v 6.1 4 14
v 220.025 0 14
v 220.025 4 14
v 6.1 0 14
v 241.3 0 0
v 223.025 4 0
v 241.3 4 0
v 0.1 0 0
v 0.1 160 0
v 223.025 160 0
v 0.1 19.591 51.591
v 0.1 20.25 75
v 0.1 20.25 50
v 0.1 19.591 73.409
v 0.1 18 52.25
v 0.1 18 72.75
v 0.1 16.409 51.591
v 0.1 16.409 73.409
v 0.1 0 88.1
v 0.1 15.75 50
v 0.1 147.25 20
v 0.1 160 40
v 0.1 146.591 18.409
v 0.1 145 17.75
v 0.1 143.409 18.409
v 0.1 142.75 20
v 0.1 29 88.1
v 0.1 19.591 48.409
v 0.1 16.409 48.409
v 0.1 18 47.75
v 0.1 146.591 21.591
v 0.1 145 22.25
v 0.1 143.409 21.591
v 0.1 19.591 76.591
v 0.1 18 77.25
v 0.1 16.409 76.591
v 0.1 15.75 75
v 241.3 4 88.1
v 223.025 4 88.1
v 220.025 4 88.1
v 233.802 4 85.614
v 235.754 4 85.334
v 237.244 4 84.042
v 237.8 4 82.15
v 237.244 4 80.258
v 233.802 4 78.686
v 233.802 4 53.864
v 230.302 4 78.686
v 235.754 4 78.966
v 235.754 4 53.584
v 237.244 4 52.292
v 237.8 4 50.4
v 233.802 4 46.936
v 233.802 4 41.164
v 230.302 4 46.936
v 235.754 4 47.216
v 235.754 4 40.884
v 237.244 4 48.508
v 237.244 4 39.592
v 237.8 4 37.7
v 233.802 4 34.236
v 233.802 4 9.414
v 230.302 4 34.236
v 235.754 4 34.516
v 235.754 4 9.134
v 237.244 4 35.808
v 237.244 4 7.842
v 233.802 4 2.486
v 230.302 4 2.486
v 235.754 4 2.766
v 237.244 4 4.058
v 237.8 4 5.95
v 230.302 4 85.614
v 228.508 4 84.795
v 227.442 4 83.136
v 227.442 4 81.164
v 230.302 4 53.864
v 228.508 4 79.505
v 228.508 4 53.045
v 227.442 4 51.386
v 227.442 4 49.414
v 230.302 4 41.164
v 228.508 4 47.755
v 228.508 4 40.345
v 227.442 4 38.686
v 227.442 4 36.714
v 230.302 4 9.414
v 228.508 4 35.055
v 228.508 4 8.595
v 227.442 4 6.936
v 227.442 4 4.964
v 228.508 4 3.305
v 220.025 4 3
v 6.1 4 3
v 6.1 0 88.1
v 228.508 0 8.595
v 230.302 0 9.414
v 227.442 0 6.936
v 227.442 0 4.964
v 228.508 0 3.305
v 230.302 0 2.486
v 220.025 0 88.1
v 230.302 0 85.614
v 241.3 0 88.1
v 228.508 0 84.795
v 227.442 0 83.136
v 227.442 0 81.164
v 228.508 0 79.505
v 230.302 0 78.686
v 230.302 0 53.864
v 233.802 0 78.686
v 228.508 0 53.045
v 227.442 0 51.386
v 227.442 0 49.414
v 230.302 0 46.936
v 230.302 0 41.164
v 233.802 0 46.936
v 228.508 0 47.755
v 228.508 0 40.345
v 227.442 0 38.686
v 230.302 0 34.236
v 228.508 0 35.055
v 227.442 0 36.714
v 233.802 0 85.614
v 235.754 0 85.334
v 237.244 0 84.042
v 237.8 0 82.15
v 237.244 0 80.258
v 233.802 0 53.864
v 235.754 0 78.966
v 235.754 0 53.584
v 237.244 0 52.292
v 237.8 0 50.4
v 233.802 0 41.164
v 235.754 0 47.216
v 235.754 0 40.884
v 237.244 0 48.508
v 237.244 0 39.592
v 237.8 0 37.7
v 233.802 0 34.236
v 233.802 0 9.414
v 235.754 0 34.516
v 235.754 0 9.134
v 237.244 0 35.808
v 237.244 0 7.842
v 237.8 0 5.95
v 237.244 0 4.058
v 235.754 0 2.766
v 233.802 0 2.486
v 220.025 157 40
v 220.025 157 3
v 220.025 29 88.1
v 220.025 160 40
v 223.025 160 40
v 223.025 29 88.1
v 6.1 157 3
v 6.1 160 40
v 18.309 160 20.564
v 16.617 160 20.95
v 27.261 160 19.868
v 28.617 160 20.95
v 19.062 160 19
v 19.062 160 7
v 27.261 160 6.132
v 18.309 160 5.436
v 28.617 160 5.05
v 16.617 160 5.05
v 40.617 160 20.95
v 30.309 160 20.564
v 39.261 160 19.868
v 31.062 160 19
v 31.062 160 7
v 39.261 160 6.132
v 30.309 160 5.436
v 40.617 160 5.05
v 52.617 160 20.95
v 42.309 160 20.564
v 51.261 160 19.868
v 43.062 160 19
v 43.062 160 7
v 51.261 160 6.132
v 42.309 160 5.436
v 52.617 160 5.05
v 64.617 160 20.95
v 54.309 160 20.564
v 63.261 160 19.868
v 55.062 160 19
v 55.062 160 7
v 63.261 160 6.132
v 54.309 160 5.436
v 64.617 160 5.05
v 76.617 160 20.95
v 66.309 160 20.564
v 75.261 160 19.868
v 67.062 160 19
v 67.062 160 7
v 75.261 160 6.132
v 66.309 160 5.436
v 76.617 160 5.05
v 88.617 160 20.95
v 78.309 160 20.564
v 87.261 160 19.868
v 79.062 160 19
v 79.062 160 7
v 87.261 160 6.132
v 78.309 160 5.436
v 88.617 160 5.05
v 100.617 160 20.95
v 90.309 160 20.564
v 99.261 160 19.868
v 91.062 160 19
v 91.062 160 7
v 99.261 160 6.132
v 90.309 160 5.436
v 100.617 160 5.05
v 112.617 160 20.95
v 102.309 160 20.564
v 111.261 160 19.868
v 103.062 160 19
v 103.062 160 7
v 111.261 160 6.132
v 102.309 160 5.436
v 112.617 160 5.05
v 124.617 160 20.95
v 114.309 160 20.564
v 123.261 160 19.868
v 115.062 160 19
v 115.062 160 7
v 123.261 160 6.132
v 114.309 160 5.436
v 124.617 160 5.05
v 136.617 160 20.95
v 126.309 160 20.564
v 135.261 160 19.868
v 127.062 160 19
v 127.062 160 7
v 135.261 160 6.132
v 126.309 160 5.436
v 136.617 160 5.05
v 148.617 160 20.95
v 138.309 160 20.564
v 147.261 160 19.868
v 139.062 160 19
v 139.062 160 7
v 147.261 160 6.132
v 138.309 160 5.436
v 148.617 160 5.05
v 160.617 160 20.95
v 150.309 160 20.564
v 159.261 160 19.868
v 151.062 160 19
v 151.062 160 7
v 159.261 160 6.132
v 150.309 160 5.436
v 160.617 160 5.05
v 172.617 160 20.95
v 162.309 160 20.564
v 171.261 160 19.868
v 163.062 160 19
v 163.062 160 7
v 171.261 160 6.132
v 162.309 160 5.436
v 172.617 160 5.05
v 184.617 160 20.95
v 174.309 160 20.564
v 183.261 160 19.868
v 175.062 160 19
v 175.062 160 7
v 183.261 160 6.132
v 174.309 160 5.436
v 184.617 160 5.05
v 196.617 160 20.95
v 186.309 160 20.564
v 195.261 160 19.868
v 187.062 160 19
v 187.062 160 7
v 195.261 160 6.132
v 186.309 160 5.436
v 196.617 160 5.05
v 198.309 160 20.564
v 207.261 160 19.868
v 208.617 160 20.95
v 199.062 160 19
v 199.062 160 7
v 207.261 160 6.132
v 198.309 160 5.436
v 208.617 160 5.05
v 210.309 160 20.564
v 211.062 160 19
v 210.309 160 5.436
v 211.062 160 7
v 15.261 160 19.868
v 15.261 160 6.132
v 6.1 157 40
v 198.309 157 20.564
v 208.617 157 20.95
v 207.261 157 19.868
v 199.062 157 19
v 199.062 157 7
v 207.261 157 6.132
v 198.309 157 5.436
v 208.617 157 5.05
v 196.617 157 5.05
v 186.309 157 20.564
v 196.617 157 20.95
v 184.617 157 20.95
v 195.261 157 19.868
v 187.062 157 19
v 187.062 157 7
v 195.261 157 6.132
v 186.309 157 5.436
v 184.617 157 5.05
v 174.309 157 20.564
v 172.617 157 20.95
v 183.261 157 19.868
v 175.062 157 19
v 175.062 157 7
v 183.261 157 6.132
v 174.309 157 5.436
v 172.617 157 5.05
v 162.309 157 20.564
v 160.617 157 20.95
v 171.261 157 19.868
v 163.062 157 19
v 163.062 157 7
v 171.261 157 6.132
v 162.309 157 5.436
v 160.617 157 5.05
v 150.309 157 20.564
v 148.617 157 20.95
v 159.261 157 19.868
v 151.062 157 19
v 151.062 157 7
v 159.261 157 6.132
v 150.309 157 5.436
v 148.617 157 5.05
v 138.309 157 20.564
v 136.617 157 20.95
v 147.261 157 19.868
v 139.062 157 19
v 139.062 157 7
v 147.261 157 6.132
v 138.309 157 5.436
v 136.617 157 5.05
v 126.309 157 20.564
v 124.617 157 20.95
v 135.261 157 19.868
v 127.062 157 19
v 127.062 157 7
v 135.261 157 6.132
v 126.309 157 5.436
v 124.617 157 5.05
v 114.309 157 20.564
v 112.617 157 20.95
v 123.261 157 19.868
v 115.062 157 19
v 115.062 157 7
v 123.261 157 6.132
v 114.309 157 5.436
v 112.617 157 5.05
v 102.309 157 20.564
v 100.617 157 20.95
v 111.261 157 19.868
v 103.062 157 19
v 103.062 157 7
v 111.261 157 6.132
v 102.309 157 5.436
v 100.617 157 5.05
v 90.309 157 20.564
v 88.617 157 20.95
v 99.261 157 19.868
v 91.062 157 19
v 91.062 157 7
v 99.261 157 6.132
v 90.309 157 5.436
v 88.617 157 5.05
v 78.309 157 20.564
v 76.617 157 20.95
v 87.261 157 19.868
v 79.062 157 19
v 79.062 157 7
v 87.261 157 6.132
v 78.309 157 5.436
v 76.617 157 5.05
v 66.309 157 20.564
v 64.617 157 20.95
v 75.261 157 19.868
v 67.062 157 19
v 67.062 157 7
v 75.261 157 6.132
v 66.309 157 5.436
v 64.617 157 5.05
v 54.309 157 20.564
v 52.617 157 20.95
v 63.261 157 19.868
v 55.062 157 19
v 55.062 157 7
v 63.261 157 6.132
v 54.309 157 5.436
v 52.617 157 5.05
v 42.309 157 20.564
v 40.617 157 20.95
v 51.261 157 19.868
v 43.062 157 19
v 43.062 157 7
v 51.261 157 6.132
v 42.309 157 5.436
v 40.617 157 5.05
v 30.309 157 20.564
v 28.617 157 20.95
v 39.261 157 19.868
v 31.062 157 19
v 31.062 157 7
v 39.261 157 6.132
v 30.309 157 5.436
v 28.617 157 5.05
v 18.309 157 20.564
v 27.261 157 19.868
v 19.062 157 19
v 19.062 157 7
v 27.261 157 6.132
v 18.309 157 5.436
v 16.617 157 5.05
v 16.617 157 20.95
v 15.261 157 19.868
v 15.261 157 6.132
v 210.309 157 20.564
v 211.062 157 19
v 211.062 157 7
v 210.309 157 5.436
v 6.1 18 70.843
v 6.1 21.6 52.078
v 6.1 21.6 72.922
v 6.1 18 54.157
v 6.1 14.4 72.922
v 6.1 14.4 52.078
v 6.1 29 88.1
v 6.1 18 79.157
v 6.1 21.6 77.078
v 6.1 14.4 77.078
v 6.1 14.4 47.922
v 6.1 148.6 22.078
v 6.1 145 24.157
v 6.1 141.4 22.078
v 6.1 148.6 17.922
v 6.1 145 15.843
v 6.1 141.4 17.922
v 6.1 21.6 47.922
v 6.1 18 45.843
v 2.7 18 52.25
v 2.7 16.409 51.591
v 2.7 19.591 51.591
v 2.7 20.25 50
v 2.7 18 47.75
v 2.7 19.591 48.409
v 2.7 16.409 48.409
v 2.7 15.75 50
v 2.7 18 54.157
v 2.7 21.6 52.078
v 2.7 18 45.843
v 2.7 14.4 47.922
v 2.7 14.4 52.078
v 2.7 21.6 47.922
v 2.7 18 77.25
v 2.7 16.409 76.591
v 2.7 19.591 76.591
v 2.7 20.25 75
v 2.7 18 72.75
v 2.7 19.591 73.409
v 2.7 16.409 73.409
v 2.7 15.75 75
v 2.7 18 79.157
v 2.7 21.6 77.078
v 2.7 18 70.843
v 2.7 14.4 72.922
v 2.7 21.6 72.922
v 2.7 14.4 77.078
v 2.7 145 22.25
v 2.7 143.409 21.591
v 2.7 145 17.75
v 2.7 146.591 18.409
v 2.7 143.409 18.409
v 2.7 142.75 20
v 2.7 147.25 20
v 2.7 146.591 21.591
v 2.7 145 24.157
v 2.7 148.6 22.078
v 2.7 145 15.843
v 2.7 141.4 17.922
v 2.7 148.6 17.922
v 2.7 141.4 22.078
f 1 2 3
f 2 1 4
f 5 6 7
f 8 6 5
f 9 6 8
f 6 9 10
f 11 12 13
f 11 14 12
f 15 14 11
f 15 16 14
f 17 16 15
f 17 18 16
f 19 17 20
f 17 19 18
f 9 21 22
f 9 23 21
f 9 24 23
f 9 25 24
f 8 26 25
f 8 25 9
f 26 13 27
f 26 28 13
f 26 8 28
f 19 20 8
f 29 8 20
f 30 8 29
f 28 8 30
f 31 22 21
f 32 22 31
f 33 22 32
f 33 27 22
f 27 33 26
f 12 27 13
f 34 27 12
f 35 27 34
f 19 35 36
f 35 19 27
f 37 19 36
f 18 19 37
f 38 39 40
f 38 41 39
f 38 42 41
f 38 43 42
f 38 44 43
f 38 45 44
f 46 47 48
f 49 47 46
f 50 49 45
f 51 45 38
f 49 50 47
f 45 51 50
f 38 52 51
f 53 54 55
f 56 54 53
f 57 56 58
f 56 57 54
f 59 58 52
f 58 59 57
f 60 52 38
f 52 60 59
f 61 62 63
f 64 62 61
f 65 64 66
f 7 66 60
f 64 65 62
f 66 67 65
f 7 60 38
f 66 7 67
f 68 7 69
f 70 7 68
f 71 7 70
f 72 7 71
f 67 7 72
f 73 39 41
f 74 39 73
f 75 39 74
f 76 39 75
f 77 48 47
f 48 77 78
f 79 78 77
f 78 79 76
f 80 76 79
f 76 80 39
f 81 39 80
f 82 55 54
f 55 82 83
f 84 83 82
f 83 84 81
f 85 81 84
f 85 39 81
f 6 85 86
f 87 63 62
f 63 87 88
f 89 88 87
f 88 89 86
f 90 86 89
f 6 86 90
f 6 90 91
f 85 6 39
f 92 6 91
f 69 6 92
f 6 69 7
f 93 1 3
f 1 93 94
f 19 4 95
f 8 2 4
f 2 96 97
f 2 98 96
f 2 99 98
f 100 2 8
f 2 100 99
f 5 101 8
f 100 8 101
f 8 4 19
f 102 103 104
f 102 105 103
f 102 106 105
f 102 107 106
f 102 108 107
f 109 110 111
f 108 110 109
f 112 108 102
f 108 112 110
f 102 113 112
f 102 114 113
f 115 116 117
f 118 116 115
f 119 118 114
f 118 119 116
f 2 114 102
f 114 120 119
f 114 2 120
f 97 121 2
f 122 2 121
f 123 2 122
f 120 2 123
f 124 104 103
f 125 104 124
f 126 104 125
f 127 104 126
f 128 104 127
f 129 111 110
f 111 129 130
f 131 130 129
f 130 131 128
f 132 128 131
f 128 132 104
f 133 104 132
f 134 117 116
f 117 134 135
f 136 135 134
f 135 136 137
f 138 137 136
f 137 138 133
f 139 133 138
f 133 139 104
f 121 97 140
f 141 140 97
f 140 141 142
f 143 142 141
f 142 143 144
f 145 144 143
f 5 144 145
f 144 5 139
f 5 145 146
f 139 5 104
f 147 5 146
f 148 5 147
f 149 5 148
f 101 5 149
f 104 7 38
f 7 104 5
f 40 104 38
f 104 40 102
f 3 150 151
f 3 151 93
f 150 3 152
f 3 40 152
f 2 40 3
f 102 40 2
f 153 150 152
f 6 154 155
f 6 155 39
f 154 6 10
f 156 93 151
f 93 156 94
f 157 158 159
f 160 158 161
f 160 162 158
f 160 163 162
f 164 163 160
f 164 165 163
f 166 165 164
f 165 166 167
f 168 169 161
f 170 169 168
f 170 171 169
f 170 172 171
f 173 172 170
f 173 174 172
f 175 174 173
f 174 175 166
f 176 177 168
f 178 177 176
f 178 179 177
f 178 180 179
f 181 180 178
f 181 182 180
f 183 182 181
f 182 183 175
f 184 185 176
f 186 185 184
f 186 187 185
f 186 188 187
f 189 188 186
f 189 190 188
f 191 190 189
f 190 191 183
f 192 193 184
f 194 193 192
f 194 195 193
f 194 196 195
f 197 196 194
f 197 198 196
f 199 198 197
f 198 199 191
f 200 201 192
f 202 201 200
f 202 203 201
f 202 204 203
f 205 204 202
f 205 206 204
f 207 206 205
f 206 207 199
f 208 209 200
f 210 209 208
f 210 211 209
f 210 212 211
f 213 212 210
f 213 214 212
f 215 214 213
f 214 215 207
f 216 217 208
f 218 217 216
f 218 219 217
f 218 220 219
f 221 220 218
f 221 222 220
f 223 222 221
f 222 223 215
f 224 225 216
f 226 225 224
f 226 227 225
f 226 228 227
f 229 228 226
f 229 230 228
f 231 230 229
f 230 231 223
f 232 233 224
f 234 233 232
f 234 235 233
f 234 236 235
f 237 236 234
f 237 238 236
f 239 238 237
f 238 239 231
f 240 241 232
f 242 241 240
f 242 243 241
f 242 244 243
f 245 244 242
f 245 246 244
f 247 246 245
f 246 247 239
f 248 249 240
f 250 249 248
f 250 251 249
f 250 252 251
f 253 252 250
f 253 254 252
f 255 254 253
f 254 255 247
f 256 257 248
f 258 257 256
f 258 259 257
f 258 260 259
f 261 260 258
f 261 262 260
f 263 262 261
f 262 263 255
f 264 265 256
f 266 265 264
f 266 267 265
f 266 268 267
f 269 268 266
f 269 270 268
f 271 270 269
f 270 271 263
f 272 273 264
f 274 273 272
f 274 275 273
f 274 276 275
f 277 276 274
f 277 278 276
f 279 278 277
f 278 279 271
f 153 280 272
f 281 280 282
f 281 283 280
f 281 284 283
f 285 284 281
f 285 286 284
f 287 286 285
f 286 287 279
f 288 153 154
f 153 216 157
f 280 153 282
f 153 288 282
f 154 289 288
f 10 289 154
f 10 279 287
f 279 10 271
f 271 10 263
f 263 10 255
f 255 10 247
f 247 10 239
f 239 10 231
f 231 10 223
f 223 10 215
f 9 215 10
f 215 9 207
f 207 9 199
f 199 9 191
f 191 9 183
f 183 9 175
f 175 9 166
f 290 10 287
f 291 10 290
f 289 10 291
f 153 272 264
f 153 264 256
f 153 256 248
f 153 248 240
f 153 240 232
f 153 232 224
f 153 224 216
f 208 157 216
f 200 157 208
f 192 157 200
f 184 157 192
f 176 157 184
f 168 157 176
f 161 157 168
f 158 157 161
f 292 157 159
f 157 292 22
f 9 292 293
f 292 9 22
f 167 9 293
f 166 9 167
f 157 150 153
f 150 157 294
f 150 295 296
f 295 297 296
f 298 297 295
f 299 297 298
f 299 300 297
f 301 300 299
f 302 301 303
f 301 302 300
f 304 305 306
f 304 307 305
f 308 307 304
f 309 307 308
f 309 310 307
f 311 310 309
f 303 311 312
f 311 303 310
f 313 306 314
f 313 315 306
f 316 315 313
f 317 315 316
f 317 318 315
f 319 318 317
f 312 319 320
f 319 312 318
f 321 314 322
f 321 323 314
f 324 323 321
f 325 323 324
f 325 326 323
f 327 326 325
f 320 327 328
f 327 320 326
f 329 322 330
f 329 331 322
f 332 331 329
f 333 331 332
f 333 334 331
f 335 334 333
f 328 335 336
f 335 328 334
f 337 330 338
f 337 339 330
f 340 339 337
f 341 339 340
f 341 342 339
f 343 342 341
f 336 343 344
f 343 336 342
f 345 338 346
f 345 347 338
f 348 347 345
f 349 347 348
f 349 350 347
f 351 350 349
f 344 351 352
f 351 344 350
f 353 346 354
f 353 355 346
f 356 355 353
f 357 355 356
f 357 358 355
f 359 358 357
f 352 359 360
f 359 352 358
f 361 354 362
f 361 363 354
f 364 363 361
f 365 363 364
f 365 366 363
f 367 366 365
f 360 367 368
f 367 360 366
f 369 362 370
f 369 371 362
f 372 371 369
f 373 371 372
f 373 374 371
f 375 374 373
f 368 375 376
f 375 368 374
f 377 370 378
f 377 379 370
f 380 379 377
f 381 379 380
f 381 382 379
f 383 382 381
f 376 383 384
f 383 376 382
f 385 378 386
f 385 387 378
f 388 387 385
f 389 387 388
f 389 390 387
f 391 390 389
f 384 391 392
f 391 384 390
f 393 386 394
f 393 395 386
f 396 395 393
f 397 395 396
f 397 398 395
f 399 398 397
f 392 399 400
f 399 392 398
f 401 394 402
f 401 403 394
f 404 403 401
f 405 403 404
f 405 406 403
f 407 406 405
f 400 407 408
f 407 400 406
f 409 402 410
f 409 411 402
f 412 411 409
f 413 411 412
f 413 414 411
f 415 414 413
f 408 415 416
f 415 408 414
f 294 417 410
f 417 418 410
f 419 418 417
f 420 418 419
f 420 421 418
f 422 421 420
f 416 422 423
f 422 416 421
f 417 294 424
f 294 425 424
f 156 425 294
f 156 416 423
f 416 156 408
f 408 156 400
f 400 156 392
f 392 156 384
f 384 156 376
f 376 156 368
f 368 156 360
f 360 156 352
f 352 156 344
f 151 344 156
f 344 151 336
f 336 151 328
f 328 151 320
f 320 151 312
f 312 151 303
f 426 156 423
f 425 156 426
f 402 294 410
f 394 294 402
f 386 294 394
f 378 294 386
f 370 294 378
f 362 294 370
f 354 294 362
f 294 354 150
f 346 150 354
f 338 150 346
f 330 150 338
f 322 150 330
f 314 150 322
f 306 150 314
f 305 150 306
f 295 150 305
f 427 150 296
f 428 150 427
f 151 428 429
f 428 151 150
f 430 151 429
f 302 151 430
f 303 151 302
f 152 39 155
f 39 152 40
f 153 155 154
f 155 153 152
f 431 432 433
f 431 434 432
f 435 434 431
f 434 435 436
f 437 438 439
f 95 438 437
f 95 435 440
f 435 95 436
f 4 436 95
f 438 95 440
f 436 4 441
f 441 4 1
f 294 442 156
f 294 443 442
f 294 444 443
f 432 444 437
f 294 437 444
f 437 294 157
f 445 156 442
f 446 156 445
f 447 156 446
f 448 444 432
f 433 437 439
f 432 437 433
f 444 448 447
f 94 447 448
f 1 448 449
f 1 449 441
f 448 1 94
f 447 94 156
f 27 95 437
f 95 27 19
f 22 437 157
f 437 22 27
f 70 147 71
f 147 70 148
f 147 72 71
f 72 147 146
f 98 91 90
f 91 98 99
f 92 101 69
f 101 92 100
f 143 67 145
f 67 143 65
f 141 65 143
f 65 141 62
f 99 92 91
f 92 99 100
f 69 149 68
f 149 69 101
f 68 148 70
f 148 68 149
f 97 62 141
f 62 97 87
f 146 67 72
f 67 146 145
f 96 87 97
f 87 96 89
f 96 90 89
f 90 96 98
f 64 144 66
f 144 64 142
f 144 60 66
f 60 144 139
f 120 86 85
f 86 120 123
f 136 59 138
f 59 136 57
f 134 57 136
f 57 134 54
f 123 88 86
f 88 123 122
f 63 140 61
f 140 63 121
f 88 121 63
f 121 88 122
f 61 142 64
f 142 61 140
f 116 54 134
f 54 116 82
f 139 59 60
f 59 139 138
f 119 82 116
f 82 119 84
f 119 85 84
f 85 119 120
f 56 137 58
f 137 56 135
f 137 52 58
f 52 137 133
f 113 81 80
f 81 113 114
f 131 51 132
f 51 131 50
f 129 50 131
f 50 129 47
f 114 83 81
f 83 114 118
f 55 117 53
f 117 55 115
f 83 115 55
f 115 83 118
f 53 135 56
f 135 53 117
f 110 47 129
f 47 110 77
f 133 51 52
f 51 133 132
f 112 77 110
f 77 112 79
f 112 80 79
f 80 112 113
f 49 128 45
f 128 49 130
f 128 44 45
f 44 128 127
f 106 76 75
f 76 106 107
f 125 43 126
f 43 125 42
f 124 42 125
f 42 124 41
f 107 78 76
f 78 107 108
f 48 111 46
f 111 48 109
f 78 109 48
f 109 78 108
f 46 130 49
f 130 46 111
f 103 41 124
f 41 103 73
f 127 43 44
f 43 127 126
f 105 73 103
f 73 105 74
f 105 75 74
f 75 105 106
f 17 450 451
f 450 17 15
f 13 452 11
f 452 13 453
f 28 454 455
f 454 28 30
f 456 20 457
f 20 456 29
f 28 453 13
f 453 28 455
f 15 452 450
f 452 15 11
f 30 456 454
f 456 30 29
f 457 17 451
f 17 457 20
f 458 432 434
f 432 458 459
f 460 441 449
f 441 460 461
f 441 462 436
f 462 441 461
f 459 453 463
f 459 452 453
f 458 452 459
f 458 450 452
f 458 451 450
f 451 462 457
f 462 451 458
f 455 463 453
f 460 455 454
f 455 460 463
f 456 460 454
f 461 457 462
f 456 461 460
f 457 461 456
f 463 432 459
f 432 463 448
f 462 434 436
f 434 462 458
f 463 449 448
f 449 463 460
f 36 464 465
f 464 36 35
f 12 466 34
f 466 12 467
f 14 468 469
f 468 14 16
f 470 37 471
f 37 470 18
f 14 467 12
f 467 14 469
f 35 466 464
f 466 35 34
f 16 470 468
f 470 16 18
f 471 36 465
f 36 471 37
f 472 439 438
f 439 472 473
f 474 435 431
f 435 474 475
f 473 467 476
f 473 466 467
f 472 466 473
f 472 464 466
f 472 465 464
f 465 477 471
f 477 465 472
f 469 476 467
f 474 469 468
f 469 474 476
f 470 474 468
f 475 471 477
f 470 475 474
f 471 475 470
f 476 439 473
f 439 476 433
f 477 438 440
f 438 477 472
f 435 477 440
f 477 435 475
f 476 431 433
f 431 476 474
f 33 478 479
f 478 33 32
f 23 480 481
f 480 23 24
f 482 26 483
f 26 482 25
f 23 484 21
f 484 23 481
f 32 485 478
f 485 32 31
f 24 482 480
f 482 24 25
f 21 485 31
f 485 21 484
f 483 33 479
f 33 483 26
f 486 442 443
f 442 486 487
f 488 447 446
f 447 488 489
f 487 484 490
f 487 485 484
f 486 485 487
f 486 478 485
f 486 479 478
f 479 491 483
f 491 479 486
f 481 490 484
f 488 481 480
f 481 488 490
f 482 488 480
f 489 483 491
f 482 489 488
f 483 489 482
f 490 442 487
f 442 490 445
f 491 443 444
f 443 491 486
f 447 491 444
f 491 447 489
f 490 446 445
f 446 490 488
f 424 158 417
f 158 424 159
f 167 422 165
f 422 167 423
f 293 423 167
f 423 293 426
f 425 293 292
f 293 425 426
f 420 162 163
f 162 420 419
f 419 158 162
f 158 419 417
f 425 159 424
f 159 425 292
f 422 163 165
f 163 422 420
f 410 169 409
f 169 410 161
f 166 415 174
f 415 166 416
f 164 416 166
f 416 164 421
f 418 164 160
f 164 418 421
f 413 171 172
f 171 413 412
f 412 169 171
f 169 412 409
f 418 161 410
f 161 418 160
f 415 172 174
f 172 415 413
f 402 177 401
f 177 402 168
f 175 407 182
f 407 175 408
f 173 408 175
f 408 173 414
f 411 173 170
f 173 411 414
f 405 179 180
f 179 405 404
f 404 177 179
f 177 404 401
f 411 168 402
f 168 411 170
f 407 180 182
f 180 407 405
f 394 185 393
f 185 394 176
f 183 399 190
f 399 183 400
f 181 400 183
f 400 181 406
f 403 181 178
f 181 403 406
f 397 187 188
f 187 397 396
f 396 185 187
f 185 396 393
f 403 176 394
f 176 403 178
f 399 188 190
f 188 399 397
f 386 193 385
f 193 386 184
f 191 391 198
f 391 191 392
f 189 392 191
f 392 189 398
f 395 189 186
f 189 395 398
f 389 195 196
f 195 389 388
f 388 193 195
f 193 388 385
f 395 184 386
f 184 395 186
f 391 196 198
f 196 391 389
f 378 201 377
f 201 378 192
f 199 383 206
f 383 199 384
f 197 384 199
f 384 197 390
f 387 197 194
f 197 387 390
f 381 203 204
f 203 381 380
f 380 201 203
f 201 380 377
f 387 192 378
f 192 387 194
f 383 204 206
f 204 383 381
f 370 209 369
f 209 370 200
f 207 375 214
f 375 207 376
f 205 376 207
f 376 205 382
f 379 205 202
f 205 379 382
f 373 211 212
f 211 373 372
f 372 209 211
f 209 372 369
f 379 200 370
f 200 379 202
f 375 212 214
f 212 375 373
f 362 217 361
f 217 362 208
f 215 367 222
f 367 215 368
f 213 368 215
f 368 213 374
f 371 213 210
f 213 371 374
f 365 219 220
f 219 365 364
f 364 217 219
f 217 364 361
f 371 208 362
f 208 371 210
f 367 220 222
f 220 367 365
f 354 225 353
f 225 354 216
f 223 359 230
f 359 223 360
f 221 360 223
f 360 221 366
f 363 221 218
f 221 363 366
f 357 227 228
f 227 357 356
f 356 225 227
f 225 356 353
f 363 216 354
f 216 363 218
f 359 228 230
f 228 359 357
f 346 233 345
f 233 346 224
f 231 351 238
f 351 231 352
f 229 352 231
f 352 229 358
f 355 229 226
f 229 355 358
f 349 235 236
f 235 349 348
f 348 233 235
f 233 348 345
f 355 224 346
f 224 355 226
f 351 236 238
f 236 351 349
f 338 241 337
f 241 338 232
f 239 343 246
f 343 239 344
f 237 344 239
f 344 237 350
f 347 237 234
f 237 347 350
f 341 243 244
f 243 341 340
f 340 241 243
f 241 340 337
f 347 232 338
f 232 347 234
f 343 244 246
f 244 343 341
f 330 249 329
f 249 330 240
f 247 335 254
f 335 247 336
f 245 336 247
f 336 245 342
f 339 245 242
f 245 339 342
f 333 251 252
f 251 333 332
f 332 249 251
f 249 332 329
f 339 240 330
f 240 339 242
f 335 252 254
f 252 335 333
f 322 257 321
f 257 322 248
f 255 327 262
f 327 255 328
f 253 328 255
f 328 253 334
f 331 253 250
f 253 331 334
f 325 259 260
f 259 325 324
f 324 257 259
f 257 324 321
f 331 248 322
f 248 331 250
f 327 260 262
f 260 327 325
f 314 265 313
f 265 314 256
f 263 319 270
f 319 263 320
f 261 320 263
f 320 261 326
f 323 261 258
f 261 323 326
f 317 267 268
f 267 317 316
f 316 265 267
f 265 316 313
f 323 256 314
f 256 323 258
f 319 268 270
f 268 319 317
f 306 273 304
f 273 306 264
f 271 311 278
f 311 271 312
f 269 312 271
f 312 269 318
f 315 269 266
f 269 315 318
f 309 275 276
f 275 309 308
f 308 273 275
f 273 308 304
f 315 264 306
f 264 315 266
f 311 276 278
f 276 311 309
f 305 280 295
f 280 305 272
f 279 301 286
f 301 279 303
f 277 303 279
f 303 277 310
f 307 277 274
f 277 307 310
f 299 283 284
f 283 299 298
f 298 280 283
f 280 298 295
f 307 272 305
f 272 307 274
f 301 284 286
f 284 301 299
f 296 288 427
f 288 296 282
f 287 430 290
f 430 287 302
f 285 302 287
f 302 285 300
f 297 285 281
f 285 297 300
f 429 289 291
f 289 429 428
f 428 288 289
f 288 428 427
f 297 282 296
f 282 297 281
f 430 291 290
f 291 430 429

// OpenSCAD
// Raspberry Pi rack shelf - 2U right half, plain open tray
// Render this file to generate pi_rack_shelf_2u_tray.stl

include <_pi_rack_shelf.scad>

shelf_2u_tray();
